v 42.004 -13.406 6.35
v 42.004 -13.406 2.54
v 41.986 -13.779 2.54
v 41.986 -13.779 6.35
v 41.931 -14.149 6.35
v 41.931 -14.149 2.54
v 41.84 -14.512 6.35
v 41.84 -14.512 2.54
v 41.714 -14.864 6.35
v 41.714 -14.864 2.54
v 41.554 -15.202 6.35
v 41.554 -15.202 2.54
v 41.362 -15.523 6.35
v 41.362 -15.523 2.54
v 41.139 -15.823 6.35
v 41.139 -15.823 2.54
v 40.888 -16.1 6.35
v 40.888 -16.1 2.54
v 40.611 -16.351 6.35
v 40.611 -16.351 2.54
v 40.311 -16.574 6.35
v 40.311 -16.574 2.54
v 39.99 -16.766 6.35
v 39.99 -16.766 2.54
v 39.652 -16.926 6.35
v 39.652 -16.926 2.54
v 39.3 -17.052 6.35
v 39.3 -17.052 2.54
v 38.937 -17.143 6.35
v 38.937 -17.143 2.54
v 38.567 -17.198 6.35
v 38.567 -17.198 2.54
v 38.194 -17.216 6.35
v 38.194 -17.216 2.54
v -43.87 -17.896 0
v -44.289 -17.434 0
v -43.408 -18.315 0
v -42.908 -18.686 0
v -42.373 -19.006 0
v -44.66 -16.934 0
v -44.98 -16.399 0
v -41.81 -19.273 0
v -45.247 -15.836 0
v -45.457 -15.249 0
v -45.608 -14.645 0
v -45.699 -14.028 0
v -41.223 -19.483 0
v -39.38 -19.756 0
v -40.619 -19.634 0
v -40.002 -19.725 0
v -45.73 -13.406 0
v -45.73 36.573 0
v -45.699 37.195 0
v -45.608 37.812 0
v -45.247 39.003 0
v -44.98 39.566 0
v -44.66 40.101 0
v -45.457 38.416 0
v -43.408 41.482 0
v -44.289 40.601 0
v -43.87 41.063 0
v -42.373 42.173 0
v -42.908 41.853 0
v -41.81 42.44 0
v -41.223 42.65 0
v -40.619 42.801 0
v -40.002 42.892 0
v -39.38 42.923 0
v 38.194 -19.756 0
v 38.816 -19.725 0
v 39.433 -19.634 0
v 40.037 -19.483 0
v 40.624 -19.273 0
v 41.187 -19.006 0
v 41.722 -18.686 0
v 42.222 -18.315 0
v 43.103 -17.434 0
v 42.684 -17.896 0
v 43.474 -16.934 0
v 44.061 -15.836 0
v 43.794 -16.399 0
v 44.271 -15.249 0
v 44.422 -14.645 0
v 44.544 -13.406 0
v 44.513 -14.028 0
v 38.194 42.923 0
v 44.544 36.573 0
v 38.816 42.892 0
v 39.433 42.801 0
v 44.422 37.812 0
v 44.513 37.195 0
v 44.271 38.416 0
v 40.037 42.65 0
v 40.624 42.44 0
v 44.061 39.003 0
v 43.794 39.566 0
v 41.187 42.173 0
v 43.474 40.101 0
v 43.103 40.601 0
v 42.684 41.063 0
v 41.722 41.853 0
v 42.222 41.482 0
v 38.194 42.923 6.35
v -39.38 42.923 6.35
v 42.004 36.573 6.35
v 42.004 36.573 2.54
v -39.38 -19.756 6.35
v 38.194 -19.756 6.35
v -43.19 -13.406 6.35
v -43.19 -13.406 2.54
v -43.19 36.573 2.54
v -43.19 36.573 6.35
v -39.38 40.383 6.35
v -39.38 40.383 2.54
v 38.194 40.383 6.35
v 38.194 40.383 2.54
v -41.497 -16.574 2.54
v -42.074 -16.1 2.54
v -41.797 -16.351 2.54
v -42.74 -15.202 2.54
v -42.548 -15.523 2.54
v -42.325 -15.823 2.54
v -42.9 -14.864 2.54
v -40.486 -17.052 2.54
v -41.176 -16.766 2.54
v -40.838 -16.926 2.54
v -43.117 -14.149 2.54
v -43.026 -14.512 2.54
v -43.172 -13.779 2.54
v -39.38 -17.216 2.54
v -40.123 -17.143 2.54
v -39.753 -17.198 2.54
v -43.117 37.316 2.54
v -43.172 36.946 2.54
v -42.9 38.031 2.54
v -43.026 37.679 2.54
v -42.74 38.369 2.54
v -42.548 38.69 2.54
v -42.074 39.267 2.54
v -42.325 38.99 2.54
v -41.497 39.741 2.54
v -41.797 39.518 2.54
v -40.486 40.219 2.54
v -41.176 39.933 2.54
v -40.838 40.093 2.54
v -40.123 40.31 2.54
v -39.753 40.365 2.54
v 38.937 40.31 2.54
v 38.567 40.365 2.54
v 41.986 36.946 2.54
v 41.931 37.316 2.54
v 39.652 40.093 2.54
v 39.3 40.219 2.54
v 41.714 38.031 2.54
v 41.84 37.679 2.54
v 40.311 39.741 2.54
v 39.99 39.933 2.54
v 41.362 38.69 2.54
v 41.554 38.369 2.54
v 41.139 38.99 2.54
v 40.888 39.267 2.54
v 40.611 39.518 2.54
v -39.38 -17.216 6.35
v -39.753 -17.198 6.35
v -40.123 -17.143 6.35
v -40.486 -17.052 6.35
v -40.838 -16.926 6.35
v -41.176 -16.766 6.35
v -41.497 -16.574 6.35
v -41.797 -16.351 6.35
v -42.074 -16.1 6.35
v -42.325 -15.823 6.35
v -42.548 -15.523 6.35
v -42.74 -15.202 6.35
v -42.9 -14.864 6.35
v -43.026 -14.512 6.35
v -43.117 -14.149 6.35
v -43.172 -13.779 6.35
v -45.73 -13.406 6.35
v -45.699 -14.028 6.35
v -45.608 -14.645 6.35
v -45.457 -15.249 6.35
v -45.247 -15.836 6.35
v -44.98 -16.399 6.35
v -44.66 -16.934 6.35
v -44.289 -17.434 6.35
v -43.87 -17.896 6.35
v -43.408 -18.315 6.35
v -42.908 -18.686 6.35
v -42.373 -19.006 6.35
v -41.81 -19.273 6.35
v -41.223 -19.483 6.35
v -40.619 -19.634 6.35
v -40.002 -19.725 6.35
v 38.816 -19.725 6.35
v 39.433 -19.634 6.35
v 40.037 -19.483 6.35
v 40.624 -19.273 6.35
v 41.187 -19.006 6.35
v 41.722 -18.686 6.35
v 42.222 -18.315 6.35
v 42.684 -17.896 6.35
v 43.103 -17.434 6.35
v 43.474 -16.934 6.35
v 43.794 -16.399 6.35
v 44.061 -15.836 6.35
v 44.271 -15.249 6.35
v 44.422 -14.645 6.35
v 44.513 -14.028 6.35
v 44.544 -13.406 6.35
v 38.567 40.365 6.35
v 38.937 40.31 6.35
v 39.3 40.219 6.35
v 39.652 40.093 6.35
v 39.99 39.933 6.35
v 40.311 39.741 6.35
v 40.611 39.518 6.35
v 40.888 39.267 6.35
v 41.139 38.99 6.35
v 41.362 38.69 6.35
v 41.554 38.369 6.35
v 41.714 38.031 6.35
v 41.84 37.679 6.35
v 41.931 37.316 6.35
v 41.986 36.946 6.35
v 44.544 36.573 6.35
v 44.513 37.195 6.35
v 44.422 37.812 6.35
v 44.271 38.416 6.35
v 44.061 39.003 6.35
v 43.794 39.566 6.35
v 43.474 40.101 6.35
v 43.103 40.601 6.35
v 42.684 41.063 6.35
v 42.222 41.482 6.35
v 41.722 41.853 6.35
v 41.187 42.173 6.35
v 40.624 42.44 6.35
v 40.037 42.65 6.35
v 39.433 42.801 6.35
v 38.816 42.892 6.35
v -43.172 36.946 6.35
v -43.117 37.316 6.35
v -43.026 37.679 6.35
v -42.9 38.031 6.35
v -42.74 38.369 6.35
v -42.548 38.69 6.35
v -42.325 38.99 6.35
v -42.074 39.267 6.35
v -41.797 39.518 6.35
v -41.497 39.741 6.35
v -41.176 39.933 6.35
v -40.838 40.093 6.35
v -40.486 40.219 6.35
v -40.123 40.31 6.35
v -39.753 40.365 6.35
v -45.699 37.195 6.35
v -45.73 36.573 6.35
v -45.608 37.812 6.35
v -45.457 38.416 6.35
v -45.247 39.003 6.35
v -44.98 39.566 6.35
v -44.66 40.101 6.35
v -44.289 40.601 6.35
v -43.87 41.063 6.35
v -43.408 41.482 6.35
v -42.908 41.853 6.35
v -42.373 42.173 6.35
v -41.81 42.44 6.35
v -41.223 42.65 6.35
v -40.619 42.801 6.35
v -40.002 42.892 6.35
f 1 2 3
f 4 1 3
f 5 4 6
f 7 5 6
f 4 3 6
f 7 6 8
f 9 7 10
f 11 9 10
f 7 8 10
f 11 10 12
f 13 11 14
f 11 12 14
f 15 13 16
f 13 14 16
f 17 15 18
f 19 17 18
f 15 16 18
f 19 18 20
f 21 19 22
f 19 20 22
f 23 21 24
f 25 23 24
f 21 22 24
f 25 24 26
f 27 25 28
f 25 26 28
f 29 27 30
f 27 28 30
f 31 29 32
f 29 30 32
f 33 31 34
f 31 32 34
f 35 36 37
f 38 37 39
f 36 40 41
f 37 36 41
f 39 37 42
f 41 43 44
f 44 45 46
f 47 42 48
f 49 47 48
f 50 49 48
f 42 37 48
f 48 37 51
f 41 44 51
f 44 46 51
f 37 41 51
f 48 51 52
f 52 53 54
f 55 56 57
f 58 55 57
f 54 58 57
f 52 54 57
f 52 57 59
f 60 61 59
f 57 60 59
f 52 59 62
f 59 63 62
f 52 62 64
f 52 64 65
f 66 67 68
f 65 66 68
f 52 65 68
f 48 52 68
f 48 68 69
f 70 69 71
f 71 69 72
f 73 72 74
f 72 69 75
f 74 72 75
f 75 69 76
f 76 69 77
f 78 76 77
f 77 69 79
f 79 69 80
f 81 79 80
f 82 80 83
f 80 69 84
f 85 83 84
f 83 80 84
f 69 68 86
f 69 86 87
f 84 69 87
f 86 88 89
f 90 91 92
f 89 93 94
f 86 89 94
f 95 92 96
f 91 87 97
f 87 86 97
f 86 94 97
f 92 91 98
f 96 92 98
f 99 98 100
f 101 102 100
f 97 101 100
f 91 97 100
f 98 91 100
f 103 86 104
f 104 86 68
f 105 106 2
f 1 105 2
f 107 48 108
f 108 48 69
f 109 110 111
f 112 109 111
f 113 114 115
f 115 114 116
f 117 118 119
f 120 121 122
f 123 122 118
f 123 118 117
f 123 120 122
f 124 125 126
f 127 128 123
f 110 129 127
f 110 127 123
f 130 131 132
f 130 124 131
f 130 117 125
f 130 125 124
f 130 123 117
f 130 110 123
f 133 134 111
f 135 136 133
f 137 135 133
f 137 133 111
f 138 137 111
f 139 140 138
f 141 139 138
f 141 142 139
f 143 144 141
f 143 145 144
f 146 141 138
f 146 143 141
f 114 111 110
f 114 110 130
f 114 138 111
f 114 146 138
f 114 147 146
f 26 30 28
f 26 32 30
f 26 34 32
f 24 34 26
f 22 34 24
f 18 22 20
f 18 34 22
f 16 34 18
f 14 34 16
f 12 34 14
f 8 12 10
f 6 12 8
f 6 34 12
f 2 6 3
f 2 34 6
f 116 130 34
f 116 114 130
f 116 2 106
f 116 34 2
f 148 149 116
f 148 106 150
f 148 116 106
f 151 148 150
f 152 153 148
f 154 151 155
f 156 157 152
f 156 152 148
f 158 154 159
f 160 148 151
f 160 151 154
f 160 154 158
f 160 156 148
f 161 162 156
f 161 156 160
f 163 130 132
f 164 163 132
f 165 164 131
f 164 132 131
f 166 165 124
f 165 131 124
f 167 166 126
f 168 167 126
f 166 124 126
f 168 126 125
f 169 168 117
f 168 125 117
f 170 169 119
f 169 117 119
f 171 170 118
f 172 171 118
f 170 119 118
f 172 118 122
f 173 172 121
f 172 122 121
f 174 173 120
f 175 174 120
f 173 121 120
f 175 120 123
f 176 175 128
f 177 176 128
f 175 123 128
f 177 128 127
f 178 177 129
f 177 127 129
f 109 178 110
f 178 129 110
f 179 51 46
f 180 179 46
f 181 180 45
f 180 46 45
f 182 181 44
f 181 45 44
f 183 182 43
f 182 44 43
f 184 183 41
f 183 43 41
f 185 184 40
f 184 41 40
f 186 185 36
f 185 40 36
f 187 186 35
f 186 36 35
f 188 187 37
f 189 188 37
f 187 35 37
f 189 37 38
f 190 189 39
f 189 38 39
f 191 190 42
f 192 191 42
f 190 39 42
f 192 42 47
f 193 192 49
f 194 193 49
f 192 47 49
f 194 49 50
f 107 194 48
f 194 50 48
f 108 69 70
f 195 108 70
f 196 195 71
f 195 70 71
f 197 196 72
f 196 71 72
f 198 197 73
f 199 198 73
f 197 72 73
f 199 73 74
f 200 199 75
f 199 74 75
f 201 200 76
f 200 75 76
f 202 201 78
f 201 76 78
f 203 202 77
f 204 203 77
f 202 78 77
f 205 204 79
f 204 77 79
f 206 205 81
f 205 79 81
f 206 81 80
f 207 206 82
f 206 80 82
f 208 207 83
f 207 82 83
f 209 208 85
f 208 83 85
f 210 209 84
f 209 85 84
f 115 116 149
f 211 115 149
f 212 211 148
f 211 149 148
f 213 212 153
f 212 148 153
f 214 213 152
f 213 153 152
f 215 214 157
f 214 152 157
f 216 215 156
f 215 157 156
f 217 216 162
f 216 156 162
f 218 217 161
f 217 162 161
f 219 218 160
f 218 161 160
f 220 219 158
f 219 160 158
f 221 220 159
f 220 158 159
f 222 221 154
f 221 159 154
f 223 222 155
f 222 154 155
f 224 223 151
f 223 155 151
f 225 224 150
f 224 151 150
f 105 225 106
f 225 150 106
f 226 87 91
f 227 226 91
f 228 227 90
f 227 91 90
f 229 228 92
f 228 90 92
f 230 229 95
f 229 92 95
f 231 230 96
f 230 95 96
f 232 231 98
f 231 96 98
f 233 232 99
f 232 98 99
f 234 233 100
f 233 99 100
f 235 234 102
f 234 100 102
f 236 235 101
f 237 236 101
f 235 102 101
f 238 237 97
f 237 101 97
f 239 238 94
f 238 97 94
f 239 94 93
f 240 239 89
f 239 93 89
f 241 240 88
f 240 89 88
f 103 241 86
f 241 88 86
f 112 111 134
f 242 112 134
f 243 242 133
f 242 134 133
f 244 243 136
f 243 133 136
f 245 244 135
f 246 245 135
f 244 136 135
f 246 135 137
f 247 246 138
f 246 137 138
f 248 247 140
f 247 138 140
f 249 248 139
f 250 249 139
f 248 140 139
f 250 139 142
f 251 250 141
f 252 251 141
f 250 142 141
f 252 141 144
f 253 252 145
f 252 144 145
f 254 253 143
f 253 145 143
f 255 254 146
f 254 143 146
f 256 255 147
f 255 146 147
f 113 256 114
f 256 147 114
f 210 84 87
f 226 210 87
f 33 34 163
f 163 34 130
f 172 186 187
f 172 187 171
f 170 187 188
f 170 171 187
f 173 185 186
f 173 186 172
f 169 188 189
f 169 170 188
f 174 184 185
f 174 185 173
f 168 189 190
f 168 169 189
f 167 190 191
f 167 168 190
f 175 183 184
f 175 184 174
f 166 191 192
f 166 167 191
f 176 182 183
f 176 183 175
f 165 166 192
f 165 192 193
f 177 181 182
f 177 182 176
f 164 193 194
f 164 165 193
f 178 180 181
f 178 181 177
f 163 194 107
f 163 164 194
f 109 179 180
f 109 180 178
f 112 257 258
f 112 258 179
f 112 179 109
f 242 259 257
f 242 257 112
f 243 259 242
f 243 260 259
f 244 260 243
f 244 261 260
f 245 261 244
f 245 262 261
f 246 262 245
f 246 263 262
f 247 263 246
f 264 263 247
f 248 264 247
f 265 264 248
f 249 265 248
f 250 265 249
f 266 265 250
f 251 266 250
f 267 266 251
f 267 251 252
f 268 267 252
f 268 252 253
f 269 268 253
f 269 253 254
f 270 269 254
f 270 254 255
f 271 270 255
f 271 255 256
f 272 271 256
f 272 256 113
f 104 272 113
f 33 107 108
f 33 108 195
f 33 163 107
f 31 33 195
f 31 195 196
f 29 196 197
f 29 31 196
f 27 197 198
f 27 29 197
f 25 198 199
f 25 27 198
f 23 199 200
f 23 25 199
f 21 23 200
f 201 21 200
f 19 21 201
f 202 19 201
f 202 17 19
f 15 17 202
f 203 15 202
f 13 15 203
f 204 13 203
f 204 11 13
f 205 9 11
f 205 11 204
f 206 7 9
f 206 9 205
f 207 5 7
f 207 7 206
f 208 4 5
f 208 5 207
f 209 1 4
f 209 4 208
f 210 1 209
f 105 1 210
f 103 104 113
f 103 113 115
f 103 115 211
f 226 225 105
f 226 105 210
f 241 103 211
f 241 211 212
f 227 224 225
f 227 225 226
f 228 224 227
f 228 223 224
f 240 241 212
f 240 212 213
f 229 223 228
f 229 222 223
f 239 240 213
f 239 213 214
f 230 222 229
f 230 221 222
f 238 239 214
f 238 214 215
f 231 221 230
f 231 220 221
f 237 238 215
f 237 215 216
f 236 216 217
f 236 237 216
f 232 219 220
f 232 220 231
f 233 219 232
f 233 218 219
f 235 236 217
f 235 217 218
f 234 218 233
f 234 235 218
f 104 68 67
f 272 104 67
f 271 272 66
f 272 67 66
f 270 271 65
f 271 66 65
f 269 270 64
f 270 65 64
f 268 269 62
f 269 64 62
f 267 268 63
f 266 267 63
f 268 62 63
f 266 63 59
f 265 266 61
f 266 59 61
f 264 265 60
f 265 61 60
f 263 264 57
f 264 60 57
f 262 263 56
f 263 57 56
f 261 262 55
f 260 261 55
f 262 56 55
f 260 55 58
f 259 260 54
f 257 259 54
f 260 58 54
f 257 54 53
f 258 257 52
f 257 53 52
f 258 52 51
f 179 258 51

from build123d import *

# Parameters (mm, degrees)
F3_DEPTH = 6.35
F1_DEPTH = 2.54


with BuildPart() as f3:
    # F2 (on face) → F3 (new body)
    with BuildSketch(Plane.XY):
        with BuildLine():
            ThreePointArc((44.544026, 36.572959), (42.684154, 41.063087), (38.194026, 42.922959))
            Line((38.194026, 42.922959), (-39.380025, 42.922959))
            ThreePointArc((-39.380025, 42.922959), (-43.870153, 41.063087), (-45.730025, 36.572959))
            Line((-45.730025, 36.572959), (-45.730025, -13.405945))
            ThreePointArc((-45.730025, -13.405945), (-43.870153, -17.896073), (-39.380025, -19.755945))
            Line((-39.380025, -19.755945), (38.194026, -19.755945))
            ThreePointArc((38.194026, -19.755945), (42.684154, -17.896073), (44.544026, -13.405945))
            Line((44.544026, -13.405945), (44.544026, 36.572959))
        make_face()
        with BuildLine():
            ThreePointArc((-43.190025, 36.572959), (-42.074101, 39.267036), (-39.380025, 40.382959))
            Line((-39.380025, 40.382959), (38.194026, 40.382959))
            ThreePointArc((38.194026, 40.382959), (40.888103, 39.267036), (42.004026, 36.572959))
            Line((42.004026, 36.572959), (42.004026, -13.405945))
            ThreePointArc((42.004026, -13.405945), (40.888103, -16.100021), (38.194026, -17.215945))
            Line((38.194026, -17.215945), (-39.380025, -17.215945))
            ThreePointArc((-39.380025, -17.215945), (-42.074101, -16.100021), (-43.190025, -13.405945))
            Line((-43.190025, -13.405945), (-43.190025, 36.572959))
        make_face(mode=Mode.SUBTRACT)
    extrude(amount=F3_DEPTH)

    # F0 (on Top) → F1 (join)
    with BuildSketch(Plane.XY):
        with BuildLine():
            Line((38.194026, 42.922959), (-39.380025, 42.922959))
            ThreePointArc((-39.380025, 42.922959), (-43.870153, 41.063087), (-45.730025, 36.572959))
            Line((-45.730025, 36.572959), (-45.730025, -13.405945))
            ThreePointArc((-45.730025, -13.405945), (-43.870153, -17.896073), (-39.380025, -19.755945))
            Line((-39.380025, -19.755945), (38.194026, -19.755945))
            ThreePointArc((38.194026, -19.755945), (42.684154, -17.896073), (44.544026, -13.405945))
            Line((44.544026, -13.405945), (44.544026, 36.572959))
            ThreePointArc((44.544026, 36.572959), (42.684154, 41.063087), (38.194026, 42.922959))
        make_face()
    extrude(amount=F1_DEPTH)


solid = f3.part
